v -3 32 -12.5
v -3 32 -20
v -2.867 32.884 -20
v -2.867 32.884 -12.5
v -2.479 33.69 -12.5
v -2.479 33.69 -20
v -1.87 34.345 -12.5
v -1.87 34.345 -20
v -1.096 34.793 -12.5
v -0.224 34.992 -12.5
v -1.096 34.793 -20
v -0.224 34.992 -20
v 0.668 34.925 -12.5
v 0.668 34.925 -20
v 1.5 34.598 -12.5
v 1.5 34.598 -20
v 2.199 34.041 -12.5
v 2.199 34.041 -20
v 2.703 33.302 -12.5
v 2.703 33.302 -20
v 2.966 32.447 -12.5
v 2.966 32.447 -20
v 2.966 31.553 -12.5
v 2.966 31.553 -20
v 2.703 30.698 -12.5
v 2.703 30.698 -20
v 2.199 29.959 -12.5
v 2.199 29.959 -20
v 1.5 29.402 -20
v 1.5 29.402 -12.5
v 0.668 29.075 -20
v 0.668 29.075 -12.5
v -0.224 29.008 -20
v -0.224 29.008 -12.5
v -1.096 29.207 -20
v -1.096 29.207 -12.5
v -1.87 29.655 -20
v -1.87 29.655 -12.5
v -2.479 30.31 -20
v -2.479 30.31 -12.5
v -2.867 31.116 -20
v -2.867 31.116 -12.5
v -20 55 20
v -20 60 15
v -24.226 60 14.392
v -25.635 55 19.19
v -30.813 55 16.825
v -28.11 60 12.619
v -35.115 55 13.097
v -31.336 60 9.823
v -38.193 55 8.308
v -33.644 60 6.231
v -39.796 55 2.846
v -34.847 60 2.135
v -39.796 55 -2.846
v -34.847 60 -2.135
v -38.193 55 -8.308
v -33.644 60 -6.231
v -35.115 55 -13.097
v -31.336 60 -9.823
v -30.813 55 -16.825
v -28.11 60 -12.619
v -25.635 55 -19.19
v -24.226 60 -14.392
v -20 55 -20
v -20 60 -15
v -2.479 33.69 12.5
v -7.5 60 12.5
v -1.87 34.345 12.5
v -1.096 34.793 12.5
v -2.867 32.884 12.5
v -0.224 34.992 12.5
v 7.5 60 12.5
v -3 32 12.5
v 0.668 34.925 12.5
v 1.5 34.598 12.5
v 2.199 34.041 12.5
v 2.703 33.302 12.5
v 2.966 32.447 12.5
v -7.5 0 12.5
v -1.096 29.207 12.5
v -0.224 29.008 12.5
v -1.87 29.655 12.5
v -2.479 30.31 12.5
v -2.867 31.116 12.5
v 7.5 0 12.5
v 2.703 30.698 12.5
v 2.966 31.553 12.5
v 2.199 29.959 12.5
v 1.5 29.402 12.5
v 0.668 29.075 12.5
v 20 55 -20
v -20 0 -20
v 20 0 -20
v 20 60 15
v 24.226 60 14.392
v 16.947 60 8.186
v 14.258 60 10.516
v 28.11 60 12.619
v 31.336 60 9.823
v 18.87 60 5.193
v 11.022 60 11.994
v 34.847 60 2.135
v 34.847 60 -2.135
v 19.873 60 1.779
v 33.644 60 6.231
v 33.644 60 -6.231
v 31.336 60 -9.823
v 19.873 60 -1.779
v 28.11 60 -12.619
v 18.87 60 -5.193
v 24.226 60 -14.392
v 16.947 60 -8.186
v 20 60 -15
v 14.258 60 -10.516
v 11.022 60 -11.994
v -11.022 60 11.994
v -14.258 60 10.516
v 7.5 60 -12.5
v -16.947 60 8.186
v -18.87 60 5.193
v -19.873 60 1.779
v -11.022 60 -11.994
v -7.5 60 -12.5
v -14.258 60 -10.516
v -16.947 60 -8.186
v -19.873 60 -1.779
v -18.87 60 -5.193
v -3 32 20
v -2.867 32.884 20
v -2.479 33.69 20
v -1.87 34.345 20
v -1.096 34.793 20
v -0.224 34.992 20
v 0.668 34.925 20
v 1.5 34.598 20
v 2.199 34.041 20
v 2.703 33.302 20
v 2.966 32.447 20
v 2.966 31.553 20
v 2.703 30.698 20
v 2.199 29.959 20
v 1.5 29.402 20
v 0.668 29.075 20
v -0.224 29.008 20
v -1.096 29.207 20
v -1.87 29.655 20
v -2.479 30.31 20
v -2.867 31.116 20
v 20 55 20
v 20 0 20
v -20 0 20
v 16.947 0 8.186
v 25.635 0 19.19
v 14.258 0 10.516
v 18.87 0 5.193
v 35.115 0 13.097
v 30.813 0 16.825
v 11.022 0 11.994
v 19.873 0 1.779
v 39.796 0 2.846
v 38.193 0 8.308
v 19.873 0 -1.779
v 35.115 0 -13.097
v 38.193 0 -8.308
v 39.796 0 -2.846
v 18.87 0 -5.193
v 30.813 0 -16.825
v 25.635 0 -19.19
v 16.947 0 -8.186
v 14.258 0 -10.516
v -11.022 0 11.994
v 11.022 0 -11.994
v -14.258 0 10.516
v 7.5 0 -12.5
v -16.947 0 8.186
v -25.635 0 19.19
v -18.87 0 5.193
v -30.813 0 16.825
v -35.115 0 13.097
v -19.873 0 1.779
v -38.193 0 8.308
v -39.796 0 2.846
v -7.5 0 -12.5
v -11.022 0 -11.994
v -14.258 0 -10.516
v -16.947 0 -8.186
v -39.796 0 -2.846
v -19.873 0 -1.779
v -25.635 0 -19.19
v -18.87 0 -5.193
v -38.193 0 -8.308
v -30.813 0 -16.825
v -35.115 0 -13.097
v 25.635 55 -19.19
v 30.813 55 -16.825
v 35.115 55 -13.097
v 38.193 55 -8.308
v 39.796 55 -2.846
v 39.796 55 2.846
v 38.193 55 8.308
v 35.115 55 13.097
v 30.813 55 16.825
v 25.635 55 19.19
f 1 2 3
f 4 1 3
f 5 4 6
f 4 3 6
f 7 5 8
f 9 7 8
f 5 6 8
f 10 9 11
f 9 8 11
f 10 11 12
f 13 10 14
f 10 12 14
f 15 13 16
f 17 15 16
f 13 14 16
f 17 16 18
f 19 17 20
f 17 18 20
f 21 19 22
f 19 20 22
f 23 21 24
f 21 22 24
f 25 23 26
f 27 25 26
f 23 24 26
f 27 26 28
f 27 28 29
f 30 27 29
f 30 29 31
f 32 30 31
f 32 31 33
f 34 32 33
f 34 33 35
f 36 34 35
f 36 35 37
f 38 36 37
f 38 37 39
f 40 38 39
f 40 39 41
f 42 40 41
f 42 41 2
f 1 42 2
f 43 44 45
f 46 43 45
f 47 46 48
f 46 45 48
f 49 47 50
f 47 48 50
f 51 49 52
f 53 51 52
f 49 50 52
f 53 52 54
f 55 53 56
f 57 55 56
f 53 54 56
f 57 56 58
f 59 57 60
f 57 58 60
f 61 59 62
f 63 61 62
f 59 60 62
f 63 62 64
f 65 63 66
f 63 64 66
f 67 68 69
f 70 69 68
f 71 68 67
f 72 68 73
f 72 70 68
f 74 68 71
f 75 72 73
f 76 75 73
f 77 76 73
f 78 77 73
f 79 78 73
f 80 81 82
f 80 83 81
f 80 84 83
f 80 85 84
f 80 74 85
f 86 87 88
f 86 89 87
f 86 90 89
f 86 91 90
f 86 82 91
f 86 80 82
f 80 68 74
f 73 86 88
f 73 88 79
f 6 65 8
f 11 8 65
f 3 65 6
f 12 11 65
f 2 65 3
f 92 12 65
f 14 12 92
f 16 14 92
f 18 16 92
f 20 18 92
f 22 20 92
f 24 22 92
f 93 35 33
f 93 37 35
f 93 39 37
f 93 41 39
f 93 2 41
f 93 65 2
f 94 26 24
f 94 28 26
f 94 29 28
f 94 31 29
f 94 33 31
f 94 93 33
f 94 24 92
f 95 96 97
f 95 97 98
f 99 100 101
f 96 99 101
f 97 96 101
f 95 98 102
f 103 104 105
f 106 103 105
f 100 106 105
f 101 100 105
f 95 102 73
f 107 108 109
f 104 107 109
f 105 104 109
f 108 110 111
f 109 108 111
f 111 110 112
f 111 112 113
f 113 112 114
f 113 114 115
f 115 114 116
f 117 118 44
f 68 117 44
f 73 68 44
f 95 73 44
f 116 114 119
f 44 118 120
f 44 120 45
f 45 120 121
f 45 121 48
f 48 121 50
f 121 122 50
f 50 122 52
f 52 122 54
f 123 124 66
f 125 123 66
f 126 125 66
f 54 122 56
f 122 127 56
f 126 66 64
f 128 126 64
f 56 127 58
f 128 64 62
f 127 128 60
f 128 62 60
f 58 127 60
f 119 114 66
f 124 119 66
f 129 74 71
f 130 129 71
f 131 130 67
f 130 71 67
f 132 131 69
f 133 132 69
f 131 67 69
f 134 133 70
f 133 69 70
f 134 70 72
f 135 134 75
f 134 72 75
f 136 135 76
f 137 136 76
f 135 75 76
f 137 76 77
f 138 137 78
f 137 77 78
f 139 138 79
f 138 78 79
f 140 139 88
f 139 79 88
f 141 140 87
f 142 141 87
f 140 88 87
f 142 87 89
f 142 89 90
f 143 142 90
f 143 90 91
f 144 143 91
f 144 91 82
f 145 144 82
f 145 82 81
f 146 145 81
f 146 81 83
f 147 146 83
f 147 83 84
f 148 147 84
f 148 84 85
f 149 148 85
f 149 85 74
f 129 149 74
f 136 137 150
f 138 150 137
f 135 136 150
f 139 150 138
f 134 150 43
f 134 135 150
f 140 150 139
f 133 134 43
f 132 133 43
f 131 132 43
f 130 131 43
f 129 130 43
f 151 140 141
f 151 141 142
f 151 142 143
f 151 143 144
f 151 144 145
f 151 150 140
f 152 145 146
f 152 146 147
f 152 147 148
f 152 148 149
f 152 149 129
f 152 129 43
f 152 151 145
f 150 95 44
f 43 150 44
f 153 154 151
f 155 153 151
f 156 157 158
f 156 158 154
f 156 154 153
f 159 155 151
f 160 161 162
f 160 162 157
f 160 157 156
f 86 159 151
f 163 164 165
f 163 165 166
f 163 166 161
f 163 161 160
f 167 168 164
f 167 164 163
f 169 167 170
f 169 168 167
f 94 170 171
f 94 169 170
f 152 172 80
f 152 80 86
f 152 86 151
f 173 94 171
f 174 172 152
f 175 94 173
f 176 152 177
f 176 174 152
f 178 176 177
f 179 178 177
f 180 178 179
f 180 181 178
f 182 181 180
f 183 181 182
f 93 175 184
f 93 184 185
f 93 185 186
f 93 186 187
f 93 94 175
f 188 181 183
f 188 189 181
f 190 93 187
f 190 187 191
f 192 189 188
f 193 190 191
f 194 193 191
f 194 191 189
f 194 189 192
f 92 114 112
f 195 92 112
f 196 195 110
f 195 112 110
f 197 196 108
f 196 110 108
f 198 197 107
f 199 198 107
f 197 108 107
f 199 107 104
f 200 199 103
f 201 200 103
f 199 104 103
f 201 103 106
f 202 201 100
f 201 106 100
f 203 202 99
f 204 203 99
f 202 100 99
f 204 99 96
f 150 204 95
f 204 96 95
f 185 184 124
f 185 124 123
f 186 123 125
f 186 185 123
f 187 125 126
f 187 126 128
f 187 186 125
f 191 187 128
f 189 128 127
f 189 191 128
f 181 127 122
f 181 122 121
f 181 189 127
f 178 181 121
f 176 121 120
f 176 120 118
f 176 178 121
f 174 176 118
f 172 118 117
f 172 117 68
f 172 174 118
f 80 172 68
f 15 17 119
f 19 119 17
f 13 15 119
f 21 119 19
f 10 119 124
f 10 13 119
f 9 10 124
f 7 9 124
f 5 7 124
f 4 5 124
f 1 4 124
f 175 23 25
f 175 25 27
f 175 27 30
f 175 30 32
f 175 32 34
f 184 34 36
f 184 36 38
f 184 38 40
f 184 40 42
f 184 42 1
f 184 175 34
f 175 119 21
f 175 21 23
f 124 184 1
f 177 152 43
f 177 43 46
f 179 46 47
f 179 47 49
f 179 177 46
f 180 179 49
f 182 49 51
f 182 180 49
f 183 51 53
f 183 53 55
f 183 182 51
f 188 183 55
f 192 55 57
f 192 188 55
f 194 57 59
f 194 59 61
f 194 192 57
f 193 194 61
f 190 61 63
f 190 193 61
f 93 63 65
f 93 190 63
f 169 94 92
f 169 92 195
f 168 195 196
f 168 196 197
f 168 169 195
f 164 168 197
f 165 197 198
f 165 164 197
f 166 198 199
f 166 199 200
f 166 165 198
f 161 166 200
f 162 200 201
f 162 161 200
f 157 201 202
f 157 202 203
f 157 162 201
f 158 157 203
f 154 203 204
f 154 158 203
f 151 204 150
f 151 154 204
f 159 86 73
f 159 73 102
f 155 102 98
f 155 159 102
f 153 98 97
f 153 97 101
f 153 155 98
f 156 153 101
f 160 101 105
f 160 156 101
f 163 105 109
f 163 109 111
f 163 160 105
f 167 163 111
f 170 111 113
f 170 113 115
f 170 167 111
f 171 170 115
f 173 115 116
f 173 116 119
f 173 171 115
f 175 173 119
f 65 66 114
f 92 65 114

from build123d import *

# Parameters (mm, degrees)
BOSS_EXTRUDE1_DEPTH = 60
CHAMFER1_SIZE       = 5
SKETCH3_R           = 3
CUT_EXTRUDE1_DEPTH  = 83.462112512


with BuildPart() as part:
    # Sketch2 → Boss-Extrude1 (new body)
    with BuildSketch(Plane(origin=(0, 0, 0), x_dir=(1, 0, 0), z_dir=(0, 1, 0))):
        with BuildLine():
            Line((-20, 20), (20, 20))
            ThreePointArc((20, 20), (40, 0), (20, -20))
            Line((20, -20), (-20, -20))
            ThreePointArc((-20, -20), (-40, 0), (-20, 20))
        make_face()
        with BuildLine():
            Line((7.5, 12.5), (-7.5, 12.5))
            ThreePointArc((-7.5, 12.5), (-20, 0), (-7.5, -12.5))
            Line((-7.5, -12.5), (7.5, -12.5))
            ThreePointArc((7.5, -12.5), (20, 0), (7.5, 12.5))
        make_face(mode=Mode.SUBTRACT)
    extrude(amount=BOSS_EXTRUDE1_DEPTH)

    # Chamfer1
    chamfer1_edges = [part.edges().sort_by_distance(p)[0] for p in [
        (40, 60, 0),
        (0, 60, -20),
        (-40, 60, 0),
        (0, 60, 20),
    ]]
    chamfer(chamfer1_edges, length=CHAMFER1_SIZE)

    # Sketch3 → Cut-Extrude1 (cut, through all)
    with BuildSketch(Plane(origin=(0, 0, -20), x_dir=(-1, 0, 0), z_dir=(0, 0, -1))):
        with Locations((0, 32)):
            Circle(SKETCH3_R)
    extrude(amount=-CUT_EXTRUDE1_DEPTH, mode=Mode.SUBTRACT)


solid = part.part
